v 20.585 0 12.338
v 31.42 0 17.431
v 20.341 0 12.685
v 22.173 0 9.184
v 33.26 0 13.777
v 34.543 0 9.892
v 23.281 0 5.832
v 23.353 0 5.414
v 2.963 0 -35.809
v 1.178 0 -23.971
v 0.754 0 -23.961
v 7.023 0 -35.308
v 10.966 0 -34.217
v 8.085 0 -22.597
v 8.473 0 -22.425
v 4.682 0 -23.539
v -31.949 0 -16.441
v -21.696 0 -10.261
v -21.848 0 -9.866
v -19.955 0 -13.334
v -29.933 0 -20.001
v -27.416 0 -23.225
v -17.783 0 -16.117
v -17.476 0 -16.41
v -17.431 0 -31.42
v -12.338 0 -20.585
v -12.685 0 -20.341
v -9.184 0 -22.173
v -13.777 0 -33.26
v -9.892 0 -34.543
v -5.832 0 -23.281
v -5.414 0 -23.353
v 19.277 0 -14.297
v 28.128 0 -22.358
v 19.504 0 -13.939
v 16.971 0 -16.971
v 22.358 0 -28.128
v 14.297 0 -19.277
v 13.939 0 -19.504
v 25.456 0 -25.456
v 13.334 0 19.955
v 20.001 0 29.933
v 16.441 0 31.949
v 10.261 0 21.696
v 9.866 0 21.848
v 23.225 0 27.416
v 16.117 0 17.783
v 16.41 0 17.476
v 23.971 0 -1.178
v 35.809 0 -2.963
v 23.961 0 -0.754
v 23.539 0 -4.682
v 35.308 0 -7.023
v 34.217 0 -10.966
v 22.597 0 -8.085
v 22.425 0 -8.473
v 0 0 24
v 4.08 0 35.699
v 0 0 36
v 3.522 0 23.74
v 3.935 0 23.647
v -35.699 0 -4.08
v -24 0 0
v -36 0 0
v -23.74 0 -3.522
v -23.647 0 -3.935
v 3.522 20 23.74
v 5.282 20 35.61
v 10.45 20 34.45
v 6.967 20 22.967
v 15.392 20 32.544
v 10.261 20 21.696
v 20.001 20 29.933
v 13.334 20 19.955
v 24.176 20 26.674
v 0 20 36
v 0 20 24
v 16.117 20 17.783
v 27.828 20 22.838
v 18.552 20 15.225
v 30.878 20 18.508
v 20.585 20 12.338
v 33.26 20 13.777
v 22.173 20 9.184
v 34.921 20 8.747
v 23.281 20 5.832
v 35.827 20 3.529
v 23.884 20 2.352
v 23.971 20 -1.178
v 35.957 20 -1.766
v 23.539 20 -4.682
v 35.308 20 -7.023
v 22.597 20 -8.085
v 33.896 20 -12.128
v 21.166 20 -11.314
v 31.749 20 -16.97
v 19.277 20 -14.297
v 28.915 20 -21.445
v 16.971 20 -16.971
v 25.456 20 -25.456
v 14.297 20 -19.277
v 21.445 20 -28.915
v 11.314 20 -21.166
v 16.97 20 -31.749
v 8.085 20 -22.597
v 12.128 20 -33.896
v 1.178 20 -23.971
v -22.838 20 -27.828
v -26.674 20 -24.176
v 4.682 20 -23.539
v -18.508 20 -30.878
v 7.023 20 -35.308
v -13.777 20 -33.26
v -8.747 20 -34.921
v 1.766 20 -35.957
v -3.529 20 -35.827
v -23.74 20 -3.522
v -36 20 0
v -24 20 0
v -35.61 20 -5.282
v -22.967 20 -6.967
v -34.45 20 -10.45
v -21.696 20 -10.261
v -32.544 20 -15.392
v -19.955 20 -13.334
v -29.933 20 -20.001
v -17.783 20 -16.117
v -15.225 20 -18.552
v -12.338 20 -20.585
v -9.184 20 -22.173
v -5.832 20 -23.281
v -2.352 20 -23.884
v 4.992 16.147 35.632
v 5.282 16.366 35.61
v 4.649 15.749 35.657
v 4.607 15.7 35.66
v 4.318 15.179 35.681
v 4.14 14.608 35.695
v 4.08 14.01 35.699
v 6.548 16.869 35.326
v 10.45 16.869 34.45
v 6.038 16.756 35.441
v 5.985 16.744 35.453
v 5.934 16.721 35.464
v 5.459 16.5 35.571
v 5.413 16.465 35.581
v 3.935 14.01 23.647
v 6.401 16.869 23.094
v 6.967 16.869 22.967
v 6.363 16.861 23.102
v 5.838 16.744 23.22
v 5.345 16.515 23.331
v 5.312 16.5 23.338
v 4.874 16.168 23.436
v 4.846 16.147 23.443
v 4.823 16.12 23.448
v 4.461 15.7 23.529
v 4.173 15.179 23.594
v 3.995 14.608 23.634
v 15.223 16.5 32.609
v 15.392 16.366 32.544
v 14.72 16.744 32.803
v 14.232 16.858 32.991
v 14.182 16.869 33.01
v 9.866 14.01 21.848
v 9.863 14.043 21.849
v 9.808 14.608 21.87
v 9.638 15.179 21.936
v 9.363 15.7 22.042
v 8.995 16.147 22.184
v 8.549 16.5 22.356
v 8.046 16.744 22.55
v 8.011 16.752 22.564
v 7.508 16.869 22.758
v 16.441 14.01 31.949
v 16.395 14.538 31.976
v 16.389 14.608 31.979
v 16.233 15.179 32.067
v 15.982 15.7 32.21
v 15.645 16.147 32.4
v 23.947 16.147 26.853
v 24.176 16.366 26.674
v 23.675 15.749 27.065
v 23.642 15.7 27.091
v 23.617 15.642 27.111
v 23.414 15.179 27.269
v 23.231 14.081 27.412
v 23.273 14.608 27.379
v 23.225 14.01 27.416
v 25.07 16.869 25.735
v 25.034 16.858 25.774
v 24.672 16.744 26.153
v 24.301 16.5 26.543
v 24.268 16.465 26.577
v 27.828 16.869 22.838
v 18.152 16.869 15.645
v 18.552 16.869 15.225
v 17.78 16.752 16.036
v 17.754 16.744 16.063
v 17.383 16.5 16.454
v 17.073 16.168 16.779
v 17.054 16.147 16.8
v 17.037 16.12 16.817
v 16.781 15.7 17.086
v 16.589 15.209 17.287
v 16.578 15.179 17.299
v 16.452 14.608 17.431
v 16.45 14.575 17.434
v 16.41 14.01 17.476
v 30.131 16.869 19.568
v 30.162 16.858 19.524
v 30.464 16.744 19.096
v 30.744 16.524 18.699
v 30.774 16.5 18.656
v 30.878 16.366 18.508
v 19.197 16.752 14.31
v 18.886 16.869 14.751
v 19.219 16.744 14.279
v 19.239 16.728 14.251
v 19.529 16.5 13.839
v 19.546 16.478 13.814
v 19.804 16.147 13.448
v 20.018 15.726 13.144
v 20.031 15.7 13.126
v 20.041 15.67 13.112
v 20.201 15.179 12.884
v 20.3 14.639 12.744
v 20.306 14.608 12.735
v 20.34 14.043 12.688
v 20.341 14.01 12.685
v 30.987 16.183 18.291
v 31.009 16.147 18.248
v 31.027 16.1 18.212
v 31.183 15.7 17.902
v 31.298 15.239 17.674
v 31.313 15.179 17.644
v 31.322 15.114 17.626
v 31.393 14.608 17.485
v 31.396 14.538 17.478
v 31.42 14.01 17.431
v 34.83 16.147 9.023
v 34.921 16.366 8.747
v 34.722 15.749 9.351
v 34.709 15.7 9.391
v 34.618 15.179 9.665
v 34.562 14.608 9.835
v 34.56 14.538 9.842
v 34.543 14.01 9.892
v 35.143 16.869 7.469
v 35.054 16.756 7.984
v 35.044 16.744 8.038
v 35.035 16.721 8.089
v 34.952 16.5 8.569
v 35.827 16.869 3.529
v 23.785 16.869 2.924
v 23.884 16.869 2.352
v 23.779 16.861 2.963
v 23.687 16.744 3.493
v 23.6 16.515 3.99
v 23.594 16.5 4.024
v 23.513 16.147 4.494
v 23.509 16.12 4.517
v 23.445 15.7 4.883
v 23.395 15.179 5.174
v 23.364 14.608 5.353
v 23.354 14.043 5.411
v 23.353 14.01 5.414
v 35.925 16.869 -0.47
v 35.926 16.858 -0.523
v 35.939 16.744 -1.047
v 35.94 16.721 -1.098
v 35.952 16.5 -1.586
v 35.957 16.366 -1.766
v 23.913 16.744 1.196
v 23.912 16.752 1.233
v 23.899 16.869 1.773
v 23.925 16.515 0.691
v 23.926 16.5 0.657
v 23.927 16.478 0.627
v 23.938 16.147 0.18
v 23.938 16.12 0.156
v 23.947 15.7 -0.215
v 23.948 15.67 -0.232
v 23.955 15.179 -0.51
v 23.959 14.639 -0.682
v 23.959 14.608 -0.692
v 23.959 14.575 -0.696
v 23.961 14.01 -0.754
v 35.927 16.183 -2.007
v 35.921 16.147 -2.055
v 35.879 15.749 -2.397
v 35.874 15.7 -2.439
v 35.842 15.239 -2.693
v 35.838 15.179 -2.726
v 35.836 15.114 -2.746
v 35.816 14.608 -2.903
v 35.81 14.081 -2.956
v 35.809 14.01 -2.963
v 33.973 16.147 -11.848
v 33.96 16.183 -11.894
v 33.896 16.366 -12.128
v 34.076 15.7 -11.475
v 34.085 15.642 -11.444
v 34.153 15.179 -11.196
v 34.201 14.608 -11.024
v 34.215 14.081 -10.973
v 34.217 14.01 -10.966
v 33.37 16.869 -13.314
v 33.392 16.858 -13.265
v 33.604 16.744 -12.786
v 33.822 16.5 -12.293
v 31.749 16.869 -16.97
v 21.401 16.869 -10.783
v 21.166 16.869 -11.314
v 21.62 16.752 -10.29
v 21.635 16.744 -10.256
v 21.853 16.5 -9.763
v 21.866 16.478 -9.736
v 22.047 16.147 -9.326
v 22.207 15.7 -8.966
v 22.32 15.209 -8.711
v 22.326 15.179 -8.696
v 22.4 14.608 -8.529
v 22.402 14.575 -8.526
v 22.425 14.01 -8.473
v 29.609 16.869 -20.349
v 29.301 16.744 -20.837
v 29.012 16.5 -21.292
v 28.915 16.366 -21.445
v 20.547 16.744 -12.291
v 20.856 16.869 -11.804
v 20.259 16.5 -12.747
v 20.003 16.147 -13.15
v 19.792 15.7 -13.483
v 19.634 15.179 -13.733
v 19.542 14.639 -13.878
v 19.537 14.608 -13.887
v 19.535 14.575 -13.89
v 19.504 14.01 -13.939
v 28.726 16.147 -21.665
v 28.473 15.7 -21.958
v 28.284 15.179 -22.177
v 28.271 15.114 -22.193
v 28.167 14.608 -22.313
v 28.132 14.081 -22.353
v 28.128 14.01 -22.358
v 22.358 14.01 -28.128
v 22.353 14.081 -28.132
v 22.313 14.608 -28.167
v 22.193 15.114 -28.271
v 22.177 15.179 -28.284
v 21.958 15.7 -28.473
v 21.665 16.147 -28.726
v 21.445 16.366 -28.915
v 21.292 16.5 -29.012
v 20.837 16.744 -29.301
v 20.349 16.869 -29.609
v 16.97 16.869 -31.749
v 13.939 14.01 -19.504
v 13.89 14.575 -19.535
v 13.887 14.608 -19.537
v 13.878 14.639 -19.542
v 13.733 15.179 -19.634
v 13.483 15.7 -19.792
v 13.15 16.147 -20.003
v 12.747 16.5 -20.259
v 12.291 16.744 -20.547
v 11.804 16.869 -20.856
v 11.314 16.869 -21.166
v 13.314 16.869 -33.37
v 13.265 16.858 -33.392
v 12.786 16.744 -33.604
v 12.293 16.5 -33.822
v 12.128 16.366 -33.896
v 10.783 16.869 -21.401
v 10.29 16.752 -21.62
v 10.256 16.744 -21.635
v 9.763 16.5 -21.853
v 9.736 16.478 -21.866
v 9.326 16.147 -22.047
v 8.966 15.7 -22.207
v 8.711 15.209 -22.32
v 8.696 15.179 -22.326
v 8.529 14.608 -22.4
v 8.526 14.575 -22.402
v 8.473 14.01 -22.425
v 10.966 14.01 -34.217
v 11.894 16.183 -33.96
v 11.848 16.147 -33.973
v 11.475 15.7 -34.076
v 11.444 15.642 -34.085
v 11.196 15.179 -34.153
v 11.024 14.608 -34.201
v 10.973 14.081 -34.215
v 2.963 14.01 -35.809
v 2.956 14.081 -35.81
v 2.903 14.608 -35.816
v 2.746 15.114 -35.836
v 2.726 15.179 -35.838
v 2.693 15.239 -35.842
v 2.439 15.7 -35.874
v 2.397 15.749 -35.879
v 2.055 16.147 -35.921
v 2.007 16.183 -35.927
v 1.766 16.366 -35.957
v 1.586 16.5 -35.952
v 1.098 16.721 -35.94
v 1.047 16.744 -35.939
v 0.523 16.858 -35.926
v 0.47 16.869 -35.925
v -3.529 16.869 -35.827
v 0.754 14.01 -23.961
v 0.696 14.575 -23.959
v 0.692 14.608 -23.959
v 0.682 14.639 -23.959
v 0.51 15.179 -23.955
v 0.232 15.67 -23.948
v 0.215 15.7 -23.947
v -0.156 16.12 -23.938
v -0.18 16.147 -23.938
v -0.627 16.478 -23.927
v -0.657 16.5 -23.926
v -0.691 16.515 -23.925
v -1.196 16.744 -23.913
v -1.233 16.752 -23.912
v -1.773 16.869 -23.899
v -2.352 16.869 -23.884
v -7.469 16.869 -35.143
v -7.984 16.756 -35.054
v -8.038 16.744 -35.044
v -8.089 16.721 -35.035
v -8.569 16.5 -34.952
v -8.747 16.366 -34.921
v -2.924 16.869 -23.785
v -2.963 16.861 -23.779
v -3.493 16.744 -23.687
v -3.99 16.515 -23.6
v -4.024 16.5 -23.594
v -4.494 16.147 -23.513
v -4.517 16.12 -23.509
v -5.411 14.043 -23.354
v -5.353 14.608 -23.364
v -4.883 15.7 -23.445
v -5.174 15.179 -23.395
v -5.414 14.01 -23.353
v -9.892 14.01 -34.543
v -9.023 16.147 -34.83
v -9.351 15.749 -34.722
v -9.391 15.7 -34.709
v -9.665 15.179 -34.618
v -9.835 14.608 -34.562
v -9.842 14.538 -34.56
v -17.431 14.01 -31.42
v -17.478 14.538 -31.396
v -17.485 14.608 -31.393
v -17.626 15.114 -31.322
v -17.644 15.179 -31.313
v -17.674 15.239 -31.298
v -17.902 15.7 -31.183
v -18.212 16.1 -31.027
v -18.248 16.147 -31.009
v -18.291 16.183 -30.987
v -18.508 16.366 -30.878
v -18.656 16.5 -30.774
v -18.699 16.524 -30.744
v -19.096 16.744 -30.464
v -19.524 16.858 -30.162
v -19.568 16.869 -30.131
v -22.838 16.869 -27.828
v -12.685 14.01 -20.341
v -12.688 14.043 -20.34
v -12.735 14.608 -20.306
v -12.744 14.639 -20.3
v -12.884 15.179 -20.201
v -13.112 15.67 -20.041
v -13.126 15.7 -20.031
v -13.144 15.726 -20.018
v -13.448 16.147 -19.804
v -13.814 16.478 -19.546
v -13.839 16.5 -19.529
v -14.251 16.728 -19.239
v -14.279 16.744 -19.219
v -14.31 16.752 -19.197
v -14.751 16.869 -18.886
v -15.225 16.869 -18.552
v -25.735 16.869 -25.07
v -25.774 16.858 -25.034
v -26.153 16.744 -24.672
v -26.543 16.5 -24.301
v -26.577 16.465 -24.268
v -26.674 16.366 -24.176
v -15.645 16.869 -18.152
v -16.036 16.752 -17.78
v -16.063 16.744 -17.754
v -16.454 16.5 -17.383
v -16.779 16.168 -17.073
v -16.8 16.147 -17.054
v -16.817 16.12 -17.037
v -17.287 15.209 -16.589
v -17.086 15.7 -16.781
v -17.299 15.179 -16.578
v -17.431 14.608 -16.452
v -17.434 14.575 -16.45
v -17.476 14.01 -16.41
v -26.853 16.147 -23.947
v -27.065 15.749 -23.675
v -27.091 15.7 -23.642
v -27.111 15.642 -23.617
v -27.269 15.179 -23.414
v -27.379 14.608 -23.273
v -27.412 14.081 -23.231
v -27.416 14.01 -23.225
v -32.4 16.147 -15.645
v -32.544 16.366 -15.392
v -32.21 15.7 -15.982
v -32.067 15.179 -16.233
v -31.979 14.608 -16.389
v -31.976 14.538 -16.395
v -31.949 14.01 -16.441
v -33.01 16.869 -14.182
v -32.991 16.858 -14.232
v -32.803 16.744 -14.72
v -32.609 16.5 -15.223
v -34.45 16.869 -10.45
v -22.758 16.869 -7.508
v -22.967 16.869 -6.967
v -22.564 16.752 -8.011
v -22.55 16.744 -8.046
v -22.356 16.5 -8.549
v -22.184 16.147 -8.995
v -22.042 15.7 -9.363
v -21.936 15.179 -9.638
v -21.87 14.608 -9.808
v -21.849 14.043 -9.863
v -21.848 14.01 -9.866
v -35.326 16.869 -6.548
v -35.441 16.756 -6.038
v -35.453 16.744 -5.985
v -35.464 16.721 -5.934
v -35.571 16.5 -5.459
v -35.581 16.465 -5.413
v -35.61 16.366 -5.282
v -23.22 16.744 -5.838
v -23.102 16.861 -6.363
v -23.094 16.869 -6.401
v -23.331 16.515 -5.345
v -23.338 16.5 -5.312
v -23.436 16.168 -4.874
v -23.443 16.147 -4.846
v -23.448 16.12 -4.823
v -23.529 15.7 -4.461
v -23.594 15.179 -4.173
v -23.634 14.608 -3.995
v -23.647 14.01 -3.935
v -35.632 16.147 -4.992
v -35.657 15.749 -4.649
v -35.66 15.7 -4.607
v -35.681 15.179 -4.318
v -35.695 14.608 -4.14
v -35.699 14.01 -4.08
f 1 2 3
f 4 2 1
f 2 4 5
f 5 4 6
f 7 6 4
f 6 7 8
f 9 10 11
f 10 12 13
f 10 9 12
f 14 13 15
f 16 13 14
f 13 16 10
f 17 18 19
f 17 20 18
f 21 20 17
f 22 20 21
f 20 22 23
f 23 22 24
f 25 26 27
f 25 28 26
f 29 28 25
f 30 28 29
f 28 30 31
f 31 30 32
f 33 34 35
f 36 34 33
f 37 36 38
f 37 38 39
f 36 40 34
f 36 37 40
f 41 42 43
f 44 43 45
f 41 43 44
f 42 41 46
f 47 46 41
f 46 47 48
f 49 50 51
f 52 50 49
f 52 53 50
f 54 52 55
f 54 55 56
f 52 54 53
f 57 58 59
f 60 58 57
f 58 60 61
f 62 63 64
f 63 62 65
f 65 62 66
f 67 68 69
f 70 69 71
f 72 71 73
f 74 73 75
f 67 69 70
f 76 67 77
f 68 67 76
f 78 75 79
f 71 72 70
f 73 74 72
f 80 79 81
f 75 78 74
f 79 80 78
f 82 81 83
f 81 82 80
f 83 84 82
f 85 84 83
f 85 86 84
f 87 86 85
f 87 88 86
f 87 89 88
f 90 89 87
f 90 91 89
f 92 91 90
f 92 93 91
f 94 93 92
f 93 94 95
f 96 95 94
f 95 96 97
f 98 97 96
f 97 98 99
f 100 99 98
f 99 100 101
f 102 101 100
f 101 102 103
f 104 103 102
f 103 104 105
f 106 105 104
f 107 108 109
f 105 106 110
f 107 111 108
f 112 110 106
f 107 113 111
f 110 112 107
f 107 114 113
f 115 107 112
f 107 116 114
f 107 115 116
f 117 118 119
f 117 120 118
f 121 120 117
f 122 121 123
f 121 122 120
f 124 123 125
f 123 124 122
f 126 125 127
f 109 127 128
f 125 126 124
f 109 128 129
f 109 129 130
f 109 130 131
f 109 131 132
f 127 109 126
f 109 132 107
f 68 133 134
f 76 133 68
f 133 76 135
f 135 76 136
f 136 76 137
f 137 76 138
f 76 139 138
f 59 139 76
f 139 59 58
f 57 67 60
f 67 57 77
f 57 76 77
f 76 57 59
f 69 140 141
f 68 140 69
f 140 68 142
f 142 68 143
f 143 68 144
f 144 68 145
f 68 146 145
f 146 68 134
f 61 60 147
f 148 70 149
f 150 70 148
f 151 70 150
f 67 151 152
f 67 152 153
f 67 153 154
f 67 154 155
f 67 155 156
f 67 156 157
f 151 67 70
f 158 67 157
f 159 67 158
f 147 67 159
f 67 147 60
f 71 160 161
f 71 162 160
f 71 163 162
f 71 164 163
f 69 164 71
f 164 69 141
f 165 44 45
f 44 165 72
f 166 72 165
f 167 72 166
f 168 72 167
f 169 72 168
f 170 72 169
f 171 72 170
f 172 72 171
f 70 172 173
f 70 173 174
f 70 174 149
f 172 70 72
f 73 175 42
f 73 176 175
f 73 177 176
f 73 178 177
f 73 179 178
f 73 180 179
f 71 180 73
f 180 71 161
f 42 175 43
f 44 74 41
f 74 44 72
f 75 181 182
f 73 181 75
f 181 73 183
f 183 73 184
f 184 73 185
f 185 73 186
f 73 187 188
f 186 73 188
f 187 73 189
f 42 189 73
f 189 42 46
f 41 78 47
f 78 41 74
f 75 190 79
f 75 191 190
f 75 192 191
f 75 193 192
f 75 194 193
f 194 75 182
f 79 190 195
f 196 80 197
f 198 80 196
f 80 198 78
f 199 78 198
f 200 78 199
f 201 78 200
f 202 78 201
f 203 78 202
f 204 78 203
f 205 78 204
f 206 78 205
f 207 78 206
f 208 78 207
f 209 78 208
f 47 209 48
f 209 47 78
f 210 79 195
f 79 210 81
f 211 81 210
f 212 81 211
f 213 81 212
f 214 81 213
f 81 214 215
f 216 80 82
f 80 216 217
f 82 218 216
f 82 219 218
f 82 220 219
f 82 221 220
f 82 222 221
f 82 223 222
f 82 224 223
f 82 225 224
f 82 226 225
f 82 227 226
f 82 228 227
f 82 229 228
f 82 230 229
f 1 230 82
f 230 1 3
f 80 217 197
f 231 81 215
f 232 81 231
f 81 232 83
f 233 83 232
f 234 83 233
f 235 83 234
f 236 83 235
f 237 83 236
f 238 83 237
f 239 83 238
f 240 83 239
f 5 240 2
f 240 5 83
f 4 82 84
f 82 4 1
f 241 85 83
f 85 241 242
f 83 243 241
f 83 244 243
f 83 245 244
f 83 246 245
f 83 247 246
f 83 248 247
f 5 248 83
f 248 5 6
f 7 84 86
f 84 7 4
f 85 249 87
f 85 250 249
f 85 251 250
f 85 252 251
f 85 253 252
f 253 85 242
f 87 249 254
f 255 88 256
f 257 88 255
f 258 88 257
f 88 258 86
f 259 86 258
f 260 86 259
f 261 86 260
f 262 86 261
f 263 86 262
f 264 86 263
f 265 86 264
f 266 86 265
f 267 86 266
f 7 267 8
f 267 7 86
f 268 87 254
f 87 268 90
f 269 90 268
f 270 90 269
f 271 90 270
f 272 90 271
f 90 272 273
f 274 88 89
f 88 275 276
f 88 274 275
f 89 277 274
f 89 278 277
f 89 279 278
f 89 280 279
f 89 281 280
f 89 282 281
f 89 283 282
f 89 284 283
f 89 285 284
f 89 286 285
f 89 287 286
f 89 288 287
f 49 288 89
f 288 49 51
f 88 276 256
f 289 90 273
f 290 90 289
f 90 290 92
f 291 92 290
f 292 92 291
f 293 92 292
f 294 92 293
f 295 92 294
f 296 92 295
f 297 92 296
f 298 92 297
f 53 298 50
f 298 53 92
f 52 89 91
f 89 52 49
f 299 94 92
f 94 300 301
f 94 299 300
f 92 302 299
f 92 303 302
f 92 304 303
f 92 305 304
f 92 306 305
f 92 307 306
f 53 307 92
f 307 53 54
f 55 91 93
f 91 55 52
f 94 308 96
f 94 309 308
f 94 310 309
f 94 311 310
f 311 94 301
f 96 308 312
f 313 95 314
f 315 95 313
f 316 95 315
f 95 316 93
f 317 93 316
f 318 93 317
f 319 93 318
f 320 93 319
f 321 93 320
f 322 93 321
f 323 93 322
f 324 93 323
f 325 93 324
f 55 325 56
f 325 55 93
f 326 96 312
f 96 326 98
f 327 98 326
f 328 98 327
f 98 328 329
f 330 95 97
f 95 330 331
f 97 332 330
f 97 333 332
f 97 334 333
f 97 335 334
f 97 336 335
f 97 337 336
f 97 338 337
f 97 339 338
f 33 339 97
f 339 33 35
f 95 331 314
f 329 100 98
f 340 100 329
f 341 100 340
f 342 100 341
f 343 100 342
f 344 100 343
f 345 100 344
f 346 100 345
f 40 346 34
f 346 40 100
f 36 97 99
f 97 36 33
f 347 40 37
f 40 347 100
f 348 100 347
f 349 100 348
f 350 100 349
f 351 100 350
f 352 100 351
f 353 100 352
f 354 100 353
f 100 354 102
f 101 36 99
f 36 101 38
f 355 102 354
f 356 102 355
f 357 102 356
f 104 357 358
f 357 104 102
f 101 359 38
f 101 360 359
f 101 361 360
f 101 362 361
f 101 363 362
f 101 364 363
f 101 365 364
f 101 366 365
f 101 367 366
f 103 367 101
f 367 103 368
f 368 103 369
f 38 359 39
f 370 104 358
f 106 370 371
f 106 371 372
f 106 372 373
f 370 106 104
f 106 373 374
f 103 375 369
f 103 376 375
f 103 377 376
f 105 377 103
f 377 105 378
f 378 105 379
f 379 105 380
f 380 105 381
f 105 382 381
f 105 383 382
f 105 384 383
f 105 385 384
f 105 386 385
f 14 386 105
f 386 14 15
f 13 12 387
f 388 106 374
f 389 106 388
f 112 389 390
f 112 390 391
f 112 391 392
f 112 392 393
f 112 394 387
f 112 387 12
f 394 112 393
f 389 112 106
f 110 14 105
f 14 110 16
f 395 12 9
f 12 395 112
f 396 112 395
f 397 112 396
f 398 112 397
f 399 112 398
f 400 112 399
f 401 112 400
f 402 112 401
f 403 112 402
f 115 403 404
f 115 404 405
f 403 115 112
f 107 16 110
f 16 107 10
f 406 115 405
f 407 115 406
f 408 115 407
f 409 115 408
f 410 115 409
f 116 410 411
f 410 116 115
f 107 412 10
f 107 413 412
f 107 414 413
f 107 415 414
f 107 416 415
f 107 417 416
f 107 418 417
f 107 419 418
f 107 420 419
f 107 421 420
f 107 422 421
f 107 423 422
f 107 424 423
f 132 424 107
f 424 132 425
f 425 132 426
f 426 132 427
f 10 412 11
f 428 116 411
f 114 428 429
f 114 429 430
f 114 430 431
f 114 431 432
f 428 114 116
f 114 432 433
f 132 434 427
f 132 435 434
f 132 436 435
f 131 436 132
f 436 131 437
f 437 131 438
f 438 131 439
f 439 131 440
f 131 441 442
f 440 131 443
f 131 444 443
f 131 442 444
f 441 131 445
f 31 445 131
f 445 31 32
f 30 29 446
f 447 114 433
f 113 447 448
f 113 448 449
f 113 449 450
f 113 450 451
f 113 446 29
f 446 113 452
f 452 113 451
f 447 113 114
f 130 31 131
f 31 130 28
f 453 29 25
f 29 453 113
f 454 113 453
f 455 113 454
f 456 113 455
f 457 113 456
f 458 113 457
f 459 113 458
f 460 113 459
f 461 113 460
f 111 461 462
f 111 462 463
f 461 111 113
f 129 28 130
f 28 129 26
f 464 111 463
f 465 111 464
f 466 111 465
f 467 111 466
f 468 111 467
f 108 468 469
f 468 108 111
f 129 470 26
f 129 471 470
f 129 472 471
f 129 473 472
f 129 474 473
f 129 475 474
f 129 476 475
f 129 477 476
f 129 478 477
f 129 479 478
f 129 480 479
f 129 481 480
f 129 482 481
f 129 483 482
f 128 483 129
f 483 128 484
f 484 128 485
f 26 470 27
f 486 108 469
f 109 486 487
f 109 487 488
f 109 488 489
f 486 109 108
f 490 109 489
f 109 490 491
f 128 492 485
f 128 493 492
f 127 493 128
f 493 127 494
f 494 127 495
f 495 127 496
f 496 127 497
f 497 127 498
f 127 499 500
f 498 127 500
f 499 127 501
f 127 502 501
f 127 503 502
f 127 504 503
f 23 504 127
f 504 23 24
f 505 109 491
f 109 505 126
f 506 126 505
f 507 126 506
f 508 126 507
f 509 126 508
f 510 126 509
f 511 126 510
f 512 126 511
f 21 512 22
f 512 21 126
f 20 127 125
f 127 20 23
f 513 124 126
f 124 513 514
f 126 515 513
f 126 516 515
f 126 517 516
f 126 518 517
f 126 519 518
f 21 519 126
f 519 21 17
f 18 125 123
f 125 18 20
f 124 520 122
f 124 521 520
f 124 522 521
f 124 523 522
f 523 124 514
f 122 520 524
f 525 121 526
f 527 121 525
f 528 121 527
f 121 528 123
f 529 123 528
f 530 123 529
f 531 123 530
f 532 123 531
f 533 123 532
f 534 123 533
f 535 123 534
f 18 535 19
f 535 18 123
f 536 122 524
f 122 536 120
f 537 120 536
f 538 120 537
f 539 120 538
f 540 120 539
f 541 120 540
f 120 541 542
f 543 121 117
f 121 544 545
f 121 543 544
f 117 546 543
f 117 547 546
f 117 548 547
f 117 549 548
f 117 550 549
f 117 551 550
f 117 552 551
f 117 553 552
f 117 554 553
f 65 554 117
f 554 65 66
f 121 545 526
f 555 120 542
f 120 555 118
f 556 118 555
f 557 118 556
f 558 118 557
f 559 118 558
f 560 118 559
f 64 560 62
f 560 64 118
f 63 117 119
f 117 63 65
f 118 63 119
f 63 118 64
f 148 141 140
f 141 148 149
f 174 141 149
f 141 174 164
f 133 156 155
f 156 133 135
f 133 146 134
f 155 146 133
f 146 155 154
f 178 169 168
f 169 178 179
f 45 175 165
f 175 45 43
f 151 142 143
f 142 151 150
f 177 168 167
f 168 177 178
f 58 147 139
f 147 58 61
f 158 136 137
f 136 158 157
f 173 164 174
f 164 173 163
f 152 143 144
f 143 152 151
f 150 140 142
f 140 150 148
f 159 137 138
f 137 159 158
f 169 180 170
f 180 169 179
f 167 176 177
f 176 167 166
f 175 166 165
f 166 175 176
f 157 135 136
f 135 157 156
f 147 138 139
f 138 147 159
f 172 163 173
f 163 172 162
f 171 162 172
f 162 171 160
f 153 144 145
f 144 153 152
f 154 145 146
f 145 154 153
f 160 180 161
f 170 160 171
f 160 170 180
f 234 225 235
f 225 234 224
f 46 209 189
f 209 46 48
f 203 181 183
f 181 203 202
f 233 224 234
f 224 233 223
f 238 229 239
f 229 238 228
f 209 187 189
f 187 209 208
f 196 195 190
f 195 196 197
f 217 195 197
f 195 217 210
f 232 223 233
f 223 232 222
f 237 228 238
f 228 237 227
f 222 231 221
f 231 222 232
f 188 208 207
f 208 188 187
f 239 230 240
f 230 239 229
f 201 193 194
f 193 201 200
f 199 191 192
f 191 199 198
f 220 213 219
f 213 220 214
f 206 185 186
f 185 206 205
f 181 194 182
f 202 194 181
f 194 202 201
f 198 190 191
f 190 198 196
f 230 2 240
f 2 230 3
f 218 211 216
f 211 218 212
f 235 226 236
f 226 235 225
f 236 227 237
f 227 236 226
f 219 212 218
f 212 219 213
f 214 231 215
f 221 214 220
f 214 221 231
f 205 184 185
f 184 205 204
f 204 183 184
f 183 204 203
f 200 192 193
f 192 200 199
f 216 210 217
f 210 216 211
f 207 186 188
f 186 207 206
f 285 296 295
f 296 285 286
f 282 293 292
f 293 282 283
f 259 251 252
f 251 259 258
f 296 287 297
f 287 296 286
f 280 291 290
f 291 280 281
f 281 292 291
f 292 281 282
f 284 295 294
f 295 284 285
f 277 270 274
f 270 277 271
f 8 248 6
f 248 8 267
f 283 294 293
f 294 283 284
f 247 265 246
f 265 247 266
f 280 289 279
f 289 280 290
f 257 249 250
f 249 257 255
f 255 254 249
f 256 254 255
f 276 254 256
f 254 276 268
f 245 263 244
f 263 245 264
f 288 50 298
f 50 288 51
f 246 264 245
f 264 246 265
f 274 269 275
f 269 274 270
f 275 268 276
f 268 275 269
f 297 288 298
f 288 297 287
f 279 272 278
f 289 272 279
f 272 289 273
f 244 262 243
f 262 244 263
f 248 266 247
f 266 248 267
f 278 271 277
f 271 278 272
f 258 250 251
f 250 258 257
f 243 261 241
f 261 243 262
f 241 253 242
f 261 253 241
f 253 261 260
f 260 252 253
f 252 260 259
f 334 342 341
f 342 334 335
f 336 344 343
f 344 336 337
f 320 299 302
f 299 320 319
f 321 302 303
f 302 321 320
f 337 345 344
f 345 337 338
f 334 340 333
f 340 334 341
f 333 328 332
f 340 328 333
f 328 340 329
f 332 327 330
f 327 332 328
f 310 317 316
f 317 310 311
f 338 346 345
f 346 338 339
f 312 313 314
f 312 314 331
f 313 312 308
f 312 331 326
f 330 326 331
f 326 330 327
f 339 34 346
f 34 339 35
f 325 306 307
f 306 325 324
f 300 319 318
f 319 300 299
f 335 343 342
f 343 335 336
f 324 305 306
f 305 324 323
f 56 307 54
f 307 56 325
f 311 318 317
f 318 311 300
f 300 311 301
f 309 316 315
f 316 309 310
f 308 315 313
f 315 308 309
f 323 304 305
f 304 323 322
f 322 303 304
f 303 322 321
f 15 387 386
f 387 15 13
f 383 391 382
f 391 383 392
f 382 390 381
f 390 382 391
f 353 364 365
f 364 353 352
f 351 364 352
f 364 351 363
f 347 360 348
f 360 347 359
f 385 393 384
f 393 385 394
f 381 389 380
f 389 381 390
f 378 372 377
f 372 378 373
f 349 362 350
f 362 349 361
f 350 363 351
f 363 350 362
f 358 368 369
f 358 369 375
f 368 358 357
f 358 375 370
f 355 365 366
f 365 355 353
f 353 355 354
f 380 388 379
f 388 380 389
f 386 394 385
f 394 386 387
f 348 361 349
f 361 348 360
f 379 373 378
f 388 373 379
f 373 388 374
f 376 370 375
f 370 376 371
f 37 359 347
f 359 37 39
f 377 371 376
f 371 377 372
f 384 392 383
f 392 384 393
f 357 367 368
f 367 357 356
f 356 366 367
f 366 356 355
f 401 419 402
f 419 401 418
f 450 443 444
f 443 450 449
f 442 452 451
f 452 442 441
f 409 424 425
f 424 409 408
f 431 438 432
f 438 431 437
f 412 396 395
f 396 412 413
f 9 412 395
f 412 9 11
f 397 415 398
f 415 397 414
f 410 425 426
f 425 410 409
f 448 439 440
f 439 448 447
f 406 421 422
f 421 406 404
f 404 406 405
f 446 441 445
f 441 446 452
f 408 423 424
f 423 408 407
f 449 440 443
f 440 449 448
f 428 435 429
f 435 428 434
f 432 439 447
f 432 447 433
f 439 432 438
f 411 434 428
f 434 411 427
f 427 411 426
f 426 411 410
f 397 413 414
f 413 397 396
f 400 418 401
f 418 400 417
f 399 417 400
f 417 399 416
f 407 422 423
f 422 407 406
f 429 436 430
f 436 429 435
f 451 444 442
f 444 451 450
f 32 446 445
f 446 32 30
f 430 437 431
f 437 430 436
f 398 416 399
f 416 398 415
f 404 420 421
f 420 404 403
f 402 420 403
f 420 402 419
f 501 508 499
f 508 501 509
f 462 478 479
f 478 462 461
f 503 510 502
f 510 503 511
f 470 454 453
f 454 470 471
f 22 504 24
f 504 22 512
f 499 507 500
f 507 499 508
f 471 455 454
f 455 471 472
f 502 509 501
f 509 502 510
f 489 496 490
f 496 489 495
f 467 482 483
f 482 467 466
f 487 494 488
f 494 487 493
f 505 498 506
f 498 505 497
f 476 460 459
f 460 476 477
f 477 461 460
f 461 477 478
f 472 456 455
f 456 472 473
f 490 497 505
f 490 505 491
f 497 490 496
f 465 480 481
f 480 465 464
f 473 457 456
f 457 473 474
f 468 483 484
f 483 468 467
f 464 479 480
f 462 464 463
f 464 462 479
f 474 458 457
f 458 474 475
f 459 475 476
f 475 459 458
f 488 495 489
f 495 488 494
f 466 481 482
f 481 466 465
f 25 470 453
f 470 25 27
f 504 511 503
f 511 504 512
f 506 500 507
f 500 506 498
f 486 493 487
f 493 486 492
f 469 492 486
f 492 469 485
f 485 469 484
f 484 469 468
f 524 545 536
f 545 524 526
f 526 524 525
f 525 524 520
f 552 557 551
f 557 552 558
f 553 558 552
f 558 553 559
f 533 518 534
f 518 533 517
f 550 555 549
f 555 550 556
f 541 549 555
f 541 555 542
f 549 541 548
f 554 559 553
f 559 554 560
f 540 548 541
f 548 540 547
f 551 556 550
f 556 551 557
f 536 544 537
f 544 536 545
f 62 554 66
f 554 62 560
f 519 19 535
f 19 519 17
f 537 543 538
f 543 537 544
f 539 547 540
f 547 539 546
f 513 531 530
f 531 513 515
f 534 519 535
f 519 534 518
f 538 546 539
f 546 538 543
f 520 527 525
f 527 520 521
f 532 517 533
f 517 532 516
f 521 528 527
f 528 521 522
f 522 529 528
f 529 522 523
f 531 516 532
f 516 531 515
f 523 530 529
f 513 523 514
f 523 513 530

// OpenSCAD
//
//
//

module first_balcony_section(inner_radius = 20,
                             outer_radius = 32,
                             tower_height = 20,
                             thickness = 3,
                             angle_start = 0,
                             angle_sweep = 20,
                             subsection,
                             subsection_count = 4,
                             arch_radius,
                             low_collision_box = 0,
                             high_collision_box = 0)
{
    section_width = 2 * inner_radius * sin(angle_sweep / 2);
    collision_box_z = (section_width - (2 * arch_radius)) / 2;

    if (low_collision_box == 0 && high_collision_box == 0) {
        subsection_angle_sweep = angle_sweep / subsection_count;

        p0x = inner_radius * sin(angle_start + (subsection * subsection_angle_sweep));
        p0y = tower_height - thickness;
        p0z = inner_radius * cos(angle_start + (subsection * subsection_angle_sweep));

        p1x = outer_radius * sin(angle_start + (subsection * subsection_angle_sweep));
        p1y = tower_height - thickness;
        p1z = outer_radius * cos(angle_start + (subsection * subsection_angle_sweep));

        // p2 and p3 are on the left of the section
        p2x = outer_radius * sin(angle_start + (subsection * subsection_angle_sweep) + subsection_angle_sweep);
        p2y = tower_height - thickness;
        p2z = outer_radius * cos(angle_start + (subsection * subsection_angle_sweep) + subsection_angle_sweep);

        p3x = inner_radius * sin(angle_start + (subsection * subsection_angle_sweep) + subsection_angle_sweep);
        p3y = tower_height - thickness;
        p3z = inner_radius * cos(angle_start + (subsection * subsection_angle_sweep) + subsection_angle_sweep);

        section_points = [[p0x, p0y, p0z],
                          [p1x, p1y, p1z],
                          [p2x, p2y, p2z],
                          [p3x, p3y, p3z],
                          [p0x, p0y + thickness, p0z],
                          [p1x, p1y + thickness, p1z],
                          [p2x, p2y + thickness, p2z],
                          [p3x, p3y + thickness, p3z],
            ];

        polyhedron(points=section_points,
                   faces=[[3, 2, 1, 0], // bottom
                          [4, 5, 6, 7], // top
                          [1, 2, 6, 5], // far
                          [0, 4, 7, 3], // near
                          [0, 1, 5, 4], // right
                          [7, 6, 2, 3]] // left
            );
    }  else if (low_collision_box == 1) {
        rotate([0, 180 - angle_start, 0]) {
            translate([inner_radius, 0, 0]) {
                cube([outer_radius - inner_radius, tower_height - thickness, collision_box_z], center = false);
            }
        }
    } else if (high_collision_box == 1) {
        collision_box_sweep = asin(collision_box_z / inner_radius);
        echo(collision_box_sweep=collision_box_sweep);
        // rotate([0, 180 - (angle_start + angle_sweep - collision_box_sweep), 0]) {
        rotate([0, 180 - (angle_start + angle_sweep), 0]) {
            translate([inner_radius, 0, -collision_box_z]) {
                cube([outer_radius - inner_radius, tower_height - thickness, collision_box_z], center = false);
            }
        }
    }
}


inner_radius = 24;
outer_radius = 36;
tower_height = 20;
thickness = 3;
angle_start = 0;
subsection_count = 4;

sections = 8;
total_angle_sweep = 270.0;

section_angle_sweep = total_angle_sweep / sections;
half_section_angle_sweep = section_angle_sweep / 2.0;

arch_height_ratio = 0.7;

// radius of arch-cutout cone at the inner side of the wall
arch_radius = (tower_height - thickness) - (tower_height * arch_height_ratio);
// 1/2 horizontal angle sweep to get from one side of arch-cutout to the other
arch_half_angle = asin(arch_radius / inner_radius);
// radius of arch cutout 1 closer than inner_radius
arch_cone_inner_radius = sin(arch_half_angle) * (inner_radius - 1.0);

// do a goatse stretch on the arch cutouts so that the supports touch down as a rectagle, despite the curve
cylinder_length = (outer_radius - inner_radius + 2.0);
d = (sin(half_section_angle_sweep) * (inner_radius - 1.0)) -
    (sin(half_section_angle_sweep) * (outer_radius + 1.0));
minkowski_points = [[0, 0, 0],
                    [-d, 0, cylinder_length],
                    [d, 0, cylinder_length],
                    [0, 0.01, 0],
                    [-d, 0.01, cylinder_length],
                    [d, 0.01, cylinder_length]];



combined = 1; // this can be overridden by the Makefile

if (combined == 1) {
    difference() {
        for(nth=[0:1:(sections * subsection_count - 1)]) {
            // subsection = nth - floor(nth / subsection_count);
            // for(subsection=[0:1:(subsection_count-1)]) {
                first_balcony_section(inner_radius = inner_radius,
                                      outer_radius = outer_radius,
                                      tower_height = tower_height,
                                      thickness = tower_height,
                                      angle_start = angle_start + (floor(nth / subsection_count) * section_angle_sweep),
                                      angle_sweep = section_angle_sweep,
                                      subsection = nth - (floor(nth / subsection_count) * subsection_count),
                                      subsection_count = subsection_count,
                                      arch_radius = arch_radius,
                                      low_collision_box = 0,
                                      high_collision_box = 0);
             // }
        }

        // cut out arches
        for(nth=[0:1:(sections-1)]) {
            rotate([0, section_angle_sweep * nth + section_angle_sweep / 2.0, 0])
                translate([0, tower_height * arch_height_ratio, inner_radius-1])
                minkowski() {
                     union() {
                         cylinder(h=cylinder_length,
                                  r=arch_cone_inner_radius,
                                  $fs=0.5);

                         translate([0, - tower_height / 2.0, cylinder_length / 2.0])
                         cube([arch_cone_inner_radius * 2.0,
                               tower_height,
                               cylinder_length],
                              center = true);
                     };
                     polyhedron(points=minkowski_points, faces=[[0, 1, 2],
                                                                [5, 4, 3],
                                                                [0, 3, 4, 1],
                                                                [4, 5, 2, 1],
                                                                [0, 2, 5, 3]]);
            }
        }
    }
 } else {
    // combined isn't 1, so we are making part of the collision hull.  nth will have been set by the invoker of openscad.

    if (nth < 32) {
        first_balcony_section(inner_radius = inner_radius,
                              outer_radius = outer_radius,
                              tower_height = tower_height,
                              thickness = thickness,
                              angle_start = angle_start + (floor(nth / subsection_count) * section_angle_sweep),
                              angle_sweep = section_angle_sweep,
                              subsection = nth - (floor(nth / subsection_count) * subsection_count),
                              subsection_count = subsection_count,
                              arch_radius = arch_radius,
                              low_collision_box = 0,
                              high_collision_box = 0);
    } else if (nth < 40) {
        // collision shape before the arch
        mth = nth - 32;
        first_balcony_section(inner_radius = inner_radius,
                              outer_radius = outer_radius,
                              tower_height = tower_height,
                              thickness = thickness,
                              angle_start = angle_start + mth * section_angle_sweep,
                              angle_sweep = section_angle_sweep,
                              subsection = 0,
                              subsection_count = 1,
                              arch_radius = arch_radius,
                              low_collision_box = 1,
                              high_collision_box = 0);
    } else {
      // collision shape after the arch
        oth = nth - 40;
        first_balcony_section(inner_radius = inner_radius,
                              outer_radius = outer_radius,
                              tower_height = tower_height,
                              thickness = thickness,
                              angle_start = angle_start + oth * section_angle_sweep,
                              angle_sweep = section_angle_sweep,
                              subsection = 0,
                              subsection_count = 1,
                              arch_radius = arch_radius,
                              low_collision_box = 0,
                              high_collision_box = 1);
    }
 }
